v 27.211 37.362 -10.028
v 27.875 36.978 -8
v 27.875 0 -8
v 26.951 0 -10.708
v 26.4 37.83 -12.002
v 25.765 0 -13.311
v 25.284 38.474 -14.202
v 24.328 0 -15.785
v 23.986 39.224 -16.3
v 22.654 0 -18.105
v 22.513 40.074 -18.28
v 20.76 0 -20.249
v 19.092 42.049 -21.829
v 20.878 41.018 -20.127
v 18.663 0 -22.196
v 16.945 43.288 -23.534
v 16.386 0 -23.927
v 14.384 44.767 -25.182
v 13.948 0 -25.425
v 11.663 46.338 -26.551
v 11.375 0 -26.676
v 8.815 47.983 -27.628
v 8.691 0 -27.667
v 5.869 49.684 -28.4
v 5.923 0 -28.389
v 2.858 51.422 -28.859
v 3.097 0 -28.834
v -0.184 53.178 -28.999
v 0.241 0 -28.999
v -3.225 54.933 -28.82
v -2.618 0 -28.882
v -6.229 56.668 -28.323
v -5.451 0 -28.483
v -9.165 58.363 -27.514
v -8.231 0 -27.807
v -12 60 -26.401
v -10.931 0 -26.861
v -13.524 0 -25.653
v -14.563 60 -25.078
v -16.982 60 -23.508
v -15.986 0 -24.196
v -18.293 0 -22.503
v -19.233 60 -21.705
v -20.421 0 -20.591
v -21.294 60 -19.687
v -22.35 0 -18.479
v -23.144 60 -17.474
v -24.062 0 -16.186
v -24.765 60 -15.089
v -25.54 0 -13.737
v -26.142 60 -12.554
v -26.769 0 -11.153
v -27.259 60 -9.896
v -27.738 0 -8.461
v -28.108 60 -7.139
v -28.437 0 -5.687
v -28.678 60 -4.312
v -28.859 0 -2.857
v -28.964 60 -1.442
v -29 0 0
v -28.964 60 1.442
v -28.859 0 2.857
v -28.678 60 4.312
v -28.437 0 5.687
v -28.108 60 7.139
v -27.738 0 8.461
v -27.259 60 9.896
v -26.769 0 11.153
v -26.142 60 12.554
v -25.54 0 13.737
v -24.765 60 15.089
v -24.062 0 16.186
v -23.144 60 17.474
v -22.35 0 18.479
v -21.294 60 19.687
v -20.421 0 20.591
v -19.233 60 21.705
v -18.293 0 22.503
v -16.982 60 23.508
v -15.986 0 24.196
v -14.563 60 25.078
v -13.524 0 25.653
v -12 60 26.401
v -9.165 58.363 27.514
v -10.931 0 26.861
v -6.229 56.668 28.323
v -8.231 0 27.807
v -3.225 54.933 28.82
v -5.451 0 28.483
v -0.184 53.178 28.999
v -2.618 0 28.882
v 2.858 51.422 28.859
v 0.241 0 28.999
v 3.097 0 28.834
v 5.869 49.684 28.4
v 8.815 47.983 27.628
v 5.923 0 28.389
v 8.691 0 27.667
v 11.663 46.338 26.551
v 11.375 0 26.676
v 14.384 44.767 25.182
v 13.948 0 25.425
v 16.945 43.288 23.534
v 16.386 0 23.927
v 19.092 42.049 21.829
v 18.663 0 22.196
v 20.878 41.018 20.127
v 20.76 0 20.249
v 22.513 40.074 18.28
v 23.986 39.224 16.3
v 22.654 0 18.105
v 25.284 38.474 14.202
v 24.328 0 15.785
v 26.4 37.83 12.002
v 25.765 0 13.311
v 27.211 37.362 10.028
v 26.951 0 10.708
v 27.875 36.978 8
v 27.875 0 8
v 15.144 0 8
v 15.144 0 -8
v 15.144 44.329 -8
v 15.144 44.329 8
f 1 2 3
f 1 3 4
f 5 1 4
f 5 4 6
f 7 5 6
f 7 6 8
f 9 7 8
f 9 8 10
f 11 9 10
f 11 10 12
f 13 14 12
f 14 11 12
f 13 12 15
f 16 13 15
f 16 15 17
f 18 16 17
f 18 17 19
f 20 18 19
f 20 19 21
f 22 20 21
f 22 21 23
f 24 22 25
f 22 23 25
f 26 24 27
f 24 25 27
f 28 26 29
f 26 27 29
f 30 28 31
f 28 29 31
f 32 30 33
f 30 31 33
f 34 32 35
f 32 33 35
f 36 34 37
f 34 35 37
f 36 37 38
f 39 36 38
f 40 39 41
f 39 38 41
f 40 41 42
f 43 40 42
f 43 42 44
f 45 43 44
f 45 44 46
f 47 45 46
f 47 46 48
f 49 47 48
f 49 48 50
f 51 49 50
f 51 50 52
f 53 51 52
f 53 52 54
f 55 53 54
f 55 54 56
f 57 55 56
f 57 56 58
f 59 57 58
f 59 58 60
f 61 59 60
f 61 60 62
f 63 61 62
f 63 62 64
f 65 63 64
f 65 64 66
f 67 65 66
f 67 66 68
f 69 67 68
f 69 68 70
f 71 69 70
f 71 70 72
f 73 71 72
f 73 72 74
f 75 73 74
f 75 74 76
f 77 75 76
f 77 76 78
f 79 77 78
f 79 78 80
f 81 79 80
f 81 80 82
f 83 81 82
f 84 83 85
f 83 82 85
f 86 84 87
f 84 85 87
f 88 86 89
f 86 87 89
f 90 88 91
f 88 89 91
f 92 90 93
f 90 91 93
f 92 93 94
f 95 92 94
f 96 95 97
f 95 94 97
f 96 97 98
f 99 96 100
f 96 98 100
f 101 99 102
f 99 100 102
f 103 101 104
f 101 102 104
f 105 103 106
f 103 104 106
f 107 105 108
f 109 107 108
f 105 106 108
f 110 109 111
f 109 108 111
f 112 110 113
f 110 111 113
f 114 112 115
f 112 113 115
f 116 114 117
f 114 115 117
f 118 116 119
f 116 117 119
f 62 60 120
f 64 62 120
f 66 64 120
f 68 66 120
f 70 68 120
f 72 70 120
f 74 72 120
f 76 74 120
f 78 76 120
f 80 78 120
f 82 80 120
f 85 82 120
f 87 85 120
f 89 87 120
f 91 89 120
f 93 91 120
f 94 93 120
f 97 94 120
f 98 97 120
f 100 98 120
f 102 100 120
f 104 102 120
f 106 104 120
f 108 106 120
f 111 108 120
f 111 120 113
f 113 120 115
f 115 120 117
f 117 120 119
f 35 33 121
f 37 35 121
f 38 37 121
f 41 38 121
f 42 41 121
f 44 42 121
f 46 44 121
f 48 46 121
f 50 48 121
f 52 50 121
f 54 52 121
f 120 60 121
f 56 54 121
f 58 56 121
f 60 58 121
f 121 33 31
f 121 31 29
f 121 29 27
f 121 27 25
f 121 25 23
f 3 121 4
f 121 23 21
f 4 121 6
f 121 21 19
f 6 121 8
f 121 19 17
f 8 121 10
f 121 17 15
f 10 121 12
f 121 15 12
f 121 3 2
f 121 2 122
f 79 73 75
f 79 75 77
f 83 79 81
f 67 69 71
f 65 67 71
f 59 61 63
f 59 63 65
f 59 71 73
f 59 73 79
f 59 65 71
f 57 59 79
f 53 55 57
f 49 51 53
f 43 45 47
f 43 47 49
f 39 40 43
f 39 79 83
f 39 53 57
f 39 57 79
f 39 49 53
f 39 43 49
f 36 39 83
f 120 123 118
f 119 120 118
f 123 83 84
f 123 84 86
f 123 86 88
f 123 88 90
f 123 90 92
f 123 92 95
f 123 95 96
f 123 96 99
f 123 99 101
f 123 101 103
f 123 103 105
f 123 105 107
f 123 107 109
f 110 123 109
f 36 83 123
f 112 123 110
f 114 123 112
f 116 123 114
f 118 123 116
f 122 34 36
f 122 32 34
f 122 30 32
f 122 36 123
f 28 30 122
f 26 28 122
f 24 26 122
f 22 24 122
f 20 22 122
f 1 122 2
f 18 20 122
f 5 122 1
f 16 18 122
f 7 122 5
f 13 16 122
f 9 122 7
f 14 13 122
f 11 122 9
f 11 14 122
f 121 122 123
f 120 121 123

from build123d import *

# Parameters (mm, degrees)
SKETCH1_R               = 29
BOSS_EXTRUDE1_DEPTH     = 60
CUT_EXTRUDE1_DEPTH      = 30
CUT_EXTRUDE1_DEPTH_BACK = 30
CUT_EXTRUDE2_DEPTH      = 70.969655115


with BuildPart() as part:
    # Sketch1 → Boss-Extrude1 (new body)
    with BuildSketch(Plane(origin=(0, 0, 0), x_dir=(1, 0, 0), z_dir=(0, 1, 0))):
        Circle(SKETCH1_R)
    extrude(amount=BOSS_EXTRUDE1_DEPTH)

    # Sketch2 → Cut-Extrude1 (cut, two sides)
    with BuildSketch(Plane.XY) as cut_extrude1_sk:
        Polygon((-12, 60), (29, 36.328638963), (29, 60), align=None)
    extrude(amount=CUT_EXTRUDE1_DEPTH, mode=Mode.SUBTRACT)
    extrude(cut_extrude1_sk.sketch, amount=-CUT_EXTRUDE1_DEPTH_BACK, mode=Mode.SUBTRACT)

    # Sketch7 → Cut-Extrude2 (cut, through all, along a direction that is not the sketch's normal)
    with BuildSketch(Plane(origin=(22.980762114, 39.803847577, 0), x_dir=(0.866025404, -0.5, 0), z_dir=(0.5, 0.866025404, 0))):
        with BuildLine():
            Line((5.651055494, 8), (-9.049582772, 8))
            Line((-9.049582772, 8), (-9.049582772, -8))
            Line((-9.049582772, -8), (5.651055494, -8))
            ThreePointArc((5.651055494, -8), (6.950417228, 0), (5.651055494, 8))
        make_face()
    extrude(amount=-CUT_EXTRUDE2_DEPTH, dir=(0, 1, 0), mode=Mode.SUBTRACT)


solid = part.part
